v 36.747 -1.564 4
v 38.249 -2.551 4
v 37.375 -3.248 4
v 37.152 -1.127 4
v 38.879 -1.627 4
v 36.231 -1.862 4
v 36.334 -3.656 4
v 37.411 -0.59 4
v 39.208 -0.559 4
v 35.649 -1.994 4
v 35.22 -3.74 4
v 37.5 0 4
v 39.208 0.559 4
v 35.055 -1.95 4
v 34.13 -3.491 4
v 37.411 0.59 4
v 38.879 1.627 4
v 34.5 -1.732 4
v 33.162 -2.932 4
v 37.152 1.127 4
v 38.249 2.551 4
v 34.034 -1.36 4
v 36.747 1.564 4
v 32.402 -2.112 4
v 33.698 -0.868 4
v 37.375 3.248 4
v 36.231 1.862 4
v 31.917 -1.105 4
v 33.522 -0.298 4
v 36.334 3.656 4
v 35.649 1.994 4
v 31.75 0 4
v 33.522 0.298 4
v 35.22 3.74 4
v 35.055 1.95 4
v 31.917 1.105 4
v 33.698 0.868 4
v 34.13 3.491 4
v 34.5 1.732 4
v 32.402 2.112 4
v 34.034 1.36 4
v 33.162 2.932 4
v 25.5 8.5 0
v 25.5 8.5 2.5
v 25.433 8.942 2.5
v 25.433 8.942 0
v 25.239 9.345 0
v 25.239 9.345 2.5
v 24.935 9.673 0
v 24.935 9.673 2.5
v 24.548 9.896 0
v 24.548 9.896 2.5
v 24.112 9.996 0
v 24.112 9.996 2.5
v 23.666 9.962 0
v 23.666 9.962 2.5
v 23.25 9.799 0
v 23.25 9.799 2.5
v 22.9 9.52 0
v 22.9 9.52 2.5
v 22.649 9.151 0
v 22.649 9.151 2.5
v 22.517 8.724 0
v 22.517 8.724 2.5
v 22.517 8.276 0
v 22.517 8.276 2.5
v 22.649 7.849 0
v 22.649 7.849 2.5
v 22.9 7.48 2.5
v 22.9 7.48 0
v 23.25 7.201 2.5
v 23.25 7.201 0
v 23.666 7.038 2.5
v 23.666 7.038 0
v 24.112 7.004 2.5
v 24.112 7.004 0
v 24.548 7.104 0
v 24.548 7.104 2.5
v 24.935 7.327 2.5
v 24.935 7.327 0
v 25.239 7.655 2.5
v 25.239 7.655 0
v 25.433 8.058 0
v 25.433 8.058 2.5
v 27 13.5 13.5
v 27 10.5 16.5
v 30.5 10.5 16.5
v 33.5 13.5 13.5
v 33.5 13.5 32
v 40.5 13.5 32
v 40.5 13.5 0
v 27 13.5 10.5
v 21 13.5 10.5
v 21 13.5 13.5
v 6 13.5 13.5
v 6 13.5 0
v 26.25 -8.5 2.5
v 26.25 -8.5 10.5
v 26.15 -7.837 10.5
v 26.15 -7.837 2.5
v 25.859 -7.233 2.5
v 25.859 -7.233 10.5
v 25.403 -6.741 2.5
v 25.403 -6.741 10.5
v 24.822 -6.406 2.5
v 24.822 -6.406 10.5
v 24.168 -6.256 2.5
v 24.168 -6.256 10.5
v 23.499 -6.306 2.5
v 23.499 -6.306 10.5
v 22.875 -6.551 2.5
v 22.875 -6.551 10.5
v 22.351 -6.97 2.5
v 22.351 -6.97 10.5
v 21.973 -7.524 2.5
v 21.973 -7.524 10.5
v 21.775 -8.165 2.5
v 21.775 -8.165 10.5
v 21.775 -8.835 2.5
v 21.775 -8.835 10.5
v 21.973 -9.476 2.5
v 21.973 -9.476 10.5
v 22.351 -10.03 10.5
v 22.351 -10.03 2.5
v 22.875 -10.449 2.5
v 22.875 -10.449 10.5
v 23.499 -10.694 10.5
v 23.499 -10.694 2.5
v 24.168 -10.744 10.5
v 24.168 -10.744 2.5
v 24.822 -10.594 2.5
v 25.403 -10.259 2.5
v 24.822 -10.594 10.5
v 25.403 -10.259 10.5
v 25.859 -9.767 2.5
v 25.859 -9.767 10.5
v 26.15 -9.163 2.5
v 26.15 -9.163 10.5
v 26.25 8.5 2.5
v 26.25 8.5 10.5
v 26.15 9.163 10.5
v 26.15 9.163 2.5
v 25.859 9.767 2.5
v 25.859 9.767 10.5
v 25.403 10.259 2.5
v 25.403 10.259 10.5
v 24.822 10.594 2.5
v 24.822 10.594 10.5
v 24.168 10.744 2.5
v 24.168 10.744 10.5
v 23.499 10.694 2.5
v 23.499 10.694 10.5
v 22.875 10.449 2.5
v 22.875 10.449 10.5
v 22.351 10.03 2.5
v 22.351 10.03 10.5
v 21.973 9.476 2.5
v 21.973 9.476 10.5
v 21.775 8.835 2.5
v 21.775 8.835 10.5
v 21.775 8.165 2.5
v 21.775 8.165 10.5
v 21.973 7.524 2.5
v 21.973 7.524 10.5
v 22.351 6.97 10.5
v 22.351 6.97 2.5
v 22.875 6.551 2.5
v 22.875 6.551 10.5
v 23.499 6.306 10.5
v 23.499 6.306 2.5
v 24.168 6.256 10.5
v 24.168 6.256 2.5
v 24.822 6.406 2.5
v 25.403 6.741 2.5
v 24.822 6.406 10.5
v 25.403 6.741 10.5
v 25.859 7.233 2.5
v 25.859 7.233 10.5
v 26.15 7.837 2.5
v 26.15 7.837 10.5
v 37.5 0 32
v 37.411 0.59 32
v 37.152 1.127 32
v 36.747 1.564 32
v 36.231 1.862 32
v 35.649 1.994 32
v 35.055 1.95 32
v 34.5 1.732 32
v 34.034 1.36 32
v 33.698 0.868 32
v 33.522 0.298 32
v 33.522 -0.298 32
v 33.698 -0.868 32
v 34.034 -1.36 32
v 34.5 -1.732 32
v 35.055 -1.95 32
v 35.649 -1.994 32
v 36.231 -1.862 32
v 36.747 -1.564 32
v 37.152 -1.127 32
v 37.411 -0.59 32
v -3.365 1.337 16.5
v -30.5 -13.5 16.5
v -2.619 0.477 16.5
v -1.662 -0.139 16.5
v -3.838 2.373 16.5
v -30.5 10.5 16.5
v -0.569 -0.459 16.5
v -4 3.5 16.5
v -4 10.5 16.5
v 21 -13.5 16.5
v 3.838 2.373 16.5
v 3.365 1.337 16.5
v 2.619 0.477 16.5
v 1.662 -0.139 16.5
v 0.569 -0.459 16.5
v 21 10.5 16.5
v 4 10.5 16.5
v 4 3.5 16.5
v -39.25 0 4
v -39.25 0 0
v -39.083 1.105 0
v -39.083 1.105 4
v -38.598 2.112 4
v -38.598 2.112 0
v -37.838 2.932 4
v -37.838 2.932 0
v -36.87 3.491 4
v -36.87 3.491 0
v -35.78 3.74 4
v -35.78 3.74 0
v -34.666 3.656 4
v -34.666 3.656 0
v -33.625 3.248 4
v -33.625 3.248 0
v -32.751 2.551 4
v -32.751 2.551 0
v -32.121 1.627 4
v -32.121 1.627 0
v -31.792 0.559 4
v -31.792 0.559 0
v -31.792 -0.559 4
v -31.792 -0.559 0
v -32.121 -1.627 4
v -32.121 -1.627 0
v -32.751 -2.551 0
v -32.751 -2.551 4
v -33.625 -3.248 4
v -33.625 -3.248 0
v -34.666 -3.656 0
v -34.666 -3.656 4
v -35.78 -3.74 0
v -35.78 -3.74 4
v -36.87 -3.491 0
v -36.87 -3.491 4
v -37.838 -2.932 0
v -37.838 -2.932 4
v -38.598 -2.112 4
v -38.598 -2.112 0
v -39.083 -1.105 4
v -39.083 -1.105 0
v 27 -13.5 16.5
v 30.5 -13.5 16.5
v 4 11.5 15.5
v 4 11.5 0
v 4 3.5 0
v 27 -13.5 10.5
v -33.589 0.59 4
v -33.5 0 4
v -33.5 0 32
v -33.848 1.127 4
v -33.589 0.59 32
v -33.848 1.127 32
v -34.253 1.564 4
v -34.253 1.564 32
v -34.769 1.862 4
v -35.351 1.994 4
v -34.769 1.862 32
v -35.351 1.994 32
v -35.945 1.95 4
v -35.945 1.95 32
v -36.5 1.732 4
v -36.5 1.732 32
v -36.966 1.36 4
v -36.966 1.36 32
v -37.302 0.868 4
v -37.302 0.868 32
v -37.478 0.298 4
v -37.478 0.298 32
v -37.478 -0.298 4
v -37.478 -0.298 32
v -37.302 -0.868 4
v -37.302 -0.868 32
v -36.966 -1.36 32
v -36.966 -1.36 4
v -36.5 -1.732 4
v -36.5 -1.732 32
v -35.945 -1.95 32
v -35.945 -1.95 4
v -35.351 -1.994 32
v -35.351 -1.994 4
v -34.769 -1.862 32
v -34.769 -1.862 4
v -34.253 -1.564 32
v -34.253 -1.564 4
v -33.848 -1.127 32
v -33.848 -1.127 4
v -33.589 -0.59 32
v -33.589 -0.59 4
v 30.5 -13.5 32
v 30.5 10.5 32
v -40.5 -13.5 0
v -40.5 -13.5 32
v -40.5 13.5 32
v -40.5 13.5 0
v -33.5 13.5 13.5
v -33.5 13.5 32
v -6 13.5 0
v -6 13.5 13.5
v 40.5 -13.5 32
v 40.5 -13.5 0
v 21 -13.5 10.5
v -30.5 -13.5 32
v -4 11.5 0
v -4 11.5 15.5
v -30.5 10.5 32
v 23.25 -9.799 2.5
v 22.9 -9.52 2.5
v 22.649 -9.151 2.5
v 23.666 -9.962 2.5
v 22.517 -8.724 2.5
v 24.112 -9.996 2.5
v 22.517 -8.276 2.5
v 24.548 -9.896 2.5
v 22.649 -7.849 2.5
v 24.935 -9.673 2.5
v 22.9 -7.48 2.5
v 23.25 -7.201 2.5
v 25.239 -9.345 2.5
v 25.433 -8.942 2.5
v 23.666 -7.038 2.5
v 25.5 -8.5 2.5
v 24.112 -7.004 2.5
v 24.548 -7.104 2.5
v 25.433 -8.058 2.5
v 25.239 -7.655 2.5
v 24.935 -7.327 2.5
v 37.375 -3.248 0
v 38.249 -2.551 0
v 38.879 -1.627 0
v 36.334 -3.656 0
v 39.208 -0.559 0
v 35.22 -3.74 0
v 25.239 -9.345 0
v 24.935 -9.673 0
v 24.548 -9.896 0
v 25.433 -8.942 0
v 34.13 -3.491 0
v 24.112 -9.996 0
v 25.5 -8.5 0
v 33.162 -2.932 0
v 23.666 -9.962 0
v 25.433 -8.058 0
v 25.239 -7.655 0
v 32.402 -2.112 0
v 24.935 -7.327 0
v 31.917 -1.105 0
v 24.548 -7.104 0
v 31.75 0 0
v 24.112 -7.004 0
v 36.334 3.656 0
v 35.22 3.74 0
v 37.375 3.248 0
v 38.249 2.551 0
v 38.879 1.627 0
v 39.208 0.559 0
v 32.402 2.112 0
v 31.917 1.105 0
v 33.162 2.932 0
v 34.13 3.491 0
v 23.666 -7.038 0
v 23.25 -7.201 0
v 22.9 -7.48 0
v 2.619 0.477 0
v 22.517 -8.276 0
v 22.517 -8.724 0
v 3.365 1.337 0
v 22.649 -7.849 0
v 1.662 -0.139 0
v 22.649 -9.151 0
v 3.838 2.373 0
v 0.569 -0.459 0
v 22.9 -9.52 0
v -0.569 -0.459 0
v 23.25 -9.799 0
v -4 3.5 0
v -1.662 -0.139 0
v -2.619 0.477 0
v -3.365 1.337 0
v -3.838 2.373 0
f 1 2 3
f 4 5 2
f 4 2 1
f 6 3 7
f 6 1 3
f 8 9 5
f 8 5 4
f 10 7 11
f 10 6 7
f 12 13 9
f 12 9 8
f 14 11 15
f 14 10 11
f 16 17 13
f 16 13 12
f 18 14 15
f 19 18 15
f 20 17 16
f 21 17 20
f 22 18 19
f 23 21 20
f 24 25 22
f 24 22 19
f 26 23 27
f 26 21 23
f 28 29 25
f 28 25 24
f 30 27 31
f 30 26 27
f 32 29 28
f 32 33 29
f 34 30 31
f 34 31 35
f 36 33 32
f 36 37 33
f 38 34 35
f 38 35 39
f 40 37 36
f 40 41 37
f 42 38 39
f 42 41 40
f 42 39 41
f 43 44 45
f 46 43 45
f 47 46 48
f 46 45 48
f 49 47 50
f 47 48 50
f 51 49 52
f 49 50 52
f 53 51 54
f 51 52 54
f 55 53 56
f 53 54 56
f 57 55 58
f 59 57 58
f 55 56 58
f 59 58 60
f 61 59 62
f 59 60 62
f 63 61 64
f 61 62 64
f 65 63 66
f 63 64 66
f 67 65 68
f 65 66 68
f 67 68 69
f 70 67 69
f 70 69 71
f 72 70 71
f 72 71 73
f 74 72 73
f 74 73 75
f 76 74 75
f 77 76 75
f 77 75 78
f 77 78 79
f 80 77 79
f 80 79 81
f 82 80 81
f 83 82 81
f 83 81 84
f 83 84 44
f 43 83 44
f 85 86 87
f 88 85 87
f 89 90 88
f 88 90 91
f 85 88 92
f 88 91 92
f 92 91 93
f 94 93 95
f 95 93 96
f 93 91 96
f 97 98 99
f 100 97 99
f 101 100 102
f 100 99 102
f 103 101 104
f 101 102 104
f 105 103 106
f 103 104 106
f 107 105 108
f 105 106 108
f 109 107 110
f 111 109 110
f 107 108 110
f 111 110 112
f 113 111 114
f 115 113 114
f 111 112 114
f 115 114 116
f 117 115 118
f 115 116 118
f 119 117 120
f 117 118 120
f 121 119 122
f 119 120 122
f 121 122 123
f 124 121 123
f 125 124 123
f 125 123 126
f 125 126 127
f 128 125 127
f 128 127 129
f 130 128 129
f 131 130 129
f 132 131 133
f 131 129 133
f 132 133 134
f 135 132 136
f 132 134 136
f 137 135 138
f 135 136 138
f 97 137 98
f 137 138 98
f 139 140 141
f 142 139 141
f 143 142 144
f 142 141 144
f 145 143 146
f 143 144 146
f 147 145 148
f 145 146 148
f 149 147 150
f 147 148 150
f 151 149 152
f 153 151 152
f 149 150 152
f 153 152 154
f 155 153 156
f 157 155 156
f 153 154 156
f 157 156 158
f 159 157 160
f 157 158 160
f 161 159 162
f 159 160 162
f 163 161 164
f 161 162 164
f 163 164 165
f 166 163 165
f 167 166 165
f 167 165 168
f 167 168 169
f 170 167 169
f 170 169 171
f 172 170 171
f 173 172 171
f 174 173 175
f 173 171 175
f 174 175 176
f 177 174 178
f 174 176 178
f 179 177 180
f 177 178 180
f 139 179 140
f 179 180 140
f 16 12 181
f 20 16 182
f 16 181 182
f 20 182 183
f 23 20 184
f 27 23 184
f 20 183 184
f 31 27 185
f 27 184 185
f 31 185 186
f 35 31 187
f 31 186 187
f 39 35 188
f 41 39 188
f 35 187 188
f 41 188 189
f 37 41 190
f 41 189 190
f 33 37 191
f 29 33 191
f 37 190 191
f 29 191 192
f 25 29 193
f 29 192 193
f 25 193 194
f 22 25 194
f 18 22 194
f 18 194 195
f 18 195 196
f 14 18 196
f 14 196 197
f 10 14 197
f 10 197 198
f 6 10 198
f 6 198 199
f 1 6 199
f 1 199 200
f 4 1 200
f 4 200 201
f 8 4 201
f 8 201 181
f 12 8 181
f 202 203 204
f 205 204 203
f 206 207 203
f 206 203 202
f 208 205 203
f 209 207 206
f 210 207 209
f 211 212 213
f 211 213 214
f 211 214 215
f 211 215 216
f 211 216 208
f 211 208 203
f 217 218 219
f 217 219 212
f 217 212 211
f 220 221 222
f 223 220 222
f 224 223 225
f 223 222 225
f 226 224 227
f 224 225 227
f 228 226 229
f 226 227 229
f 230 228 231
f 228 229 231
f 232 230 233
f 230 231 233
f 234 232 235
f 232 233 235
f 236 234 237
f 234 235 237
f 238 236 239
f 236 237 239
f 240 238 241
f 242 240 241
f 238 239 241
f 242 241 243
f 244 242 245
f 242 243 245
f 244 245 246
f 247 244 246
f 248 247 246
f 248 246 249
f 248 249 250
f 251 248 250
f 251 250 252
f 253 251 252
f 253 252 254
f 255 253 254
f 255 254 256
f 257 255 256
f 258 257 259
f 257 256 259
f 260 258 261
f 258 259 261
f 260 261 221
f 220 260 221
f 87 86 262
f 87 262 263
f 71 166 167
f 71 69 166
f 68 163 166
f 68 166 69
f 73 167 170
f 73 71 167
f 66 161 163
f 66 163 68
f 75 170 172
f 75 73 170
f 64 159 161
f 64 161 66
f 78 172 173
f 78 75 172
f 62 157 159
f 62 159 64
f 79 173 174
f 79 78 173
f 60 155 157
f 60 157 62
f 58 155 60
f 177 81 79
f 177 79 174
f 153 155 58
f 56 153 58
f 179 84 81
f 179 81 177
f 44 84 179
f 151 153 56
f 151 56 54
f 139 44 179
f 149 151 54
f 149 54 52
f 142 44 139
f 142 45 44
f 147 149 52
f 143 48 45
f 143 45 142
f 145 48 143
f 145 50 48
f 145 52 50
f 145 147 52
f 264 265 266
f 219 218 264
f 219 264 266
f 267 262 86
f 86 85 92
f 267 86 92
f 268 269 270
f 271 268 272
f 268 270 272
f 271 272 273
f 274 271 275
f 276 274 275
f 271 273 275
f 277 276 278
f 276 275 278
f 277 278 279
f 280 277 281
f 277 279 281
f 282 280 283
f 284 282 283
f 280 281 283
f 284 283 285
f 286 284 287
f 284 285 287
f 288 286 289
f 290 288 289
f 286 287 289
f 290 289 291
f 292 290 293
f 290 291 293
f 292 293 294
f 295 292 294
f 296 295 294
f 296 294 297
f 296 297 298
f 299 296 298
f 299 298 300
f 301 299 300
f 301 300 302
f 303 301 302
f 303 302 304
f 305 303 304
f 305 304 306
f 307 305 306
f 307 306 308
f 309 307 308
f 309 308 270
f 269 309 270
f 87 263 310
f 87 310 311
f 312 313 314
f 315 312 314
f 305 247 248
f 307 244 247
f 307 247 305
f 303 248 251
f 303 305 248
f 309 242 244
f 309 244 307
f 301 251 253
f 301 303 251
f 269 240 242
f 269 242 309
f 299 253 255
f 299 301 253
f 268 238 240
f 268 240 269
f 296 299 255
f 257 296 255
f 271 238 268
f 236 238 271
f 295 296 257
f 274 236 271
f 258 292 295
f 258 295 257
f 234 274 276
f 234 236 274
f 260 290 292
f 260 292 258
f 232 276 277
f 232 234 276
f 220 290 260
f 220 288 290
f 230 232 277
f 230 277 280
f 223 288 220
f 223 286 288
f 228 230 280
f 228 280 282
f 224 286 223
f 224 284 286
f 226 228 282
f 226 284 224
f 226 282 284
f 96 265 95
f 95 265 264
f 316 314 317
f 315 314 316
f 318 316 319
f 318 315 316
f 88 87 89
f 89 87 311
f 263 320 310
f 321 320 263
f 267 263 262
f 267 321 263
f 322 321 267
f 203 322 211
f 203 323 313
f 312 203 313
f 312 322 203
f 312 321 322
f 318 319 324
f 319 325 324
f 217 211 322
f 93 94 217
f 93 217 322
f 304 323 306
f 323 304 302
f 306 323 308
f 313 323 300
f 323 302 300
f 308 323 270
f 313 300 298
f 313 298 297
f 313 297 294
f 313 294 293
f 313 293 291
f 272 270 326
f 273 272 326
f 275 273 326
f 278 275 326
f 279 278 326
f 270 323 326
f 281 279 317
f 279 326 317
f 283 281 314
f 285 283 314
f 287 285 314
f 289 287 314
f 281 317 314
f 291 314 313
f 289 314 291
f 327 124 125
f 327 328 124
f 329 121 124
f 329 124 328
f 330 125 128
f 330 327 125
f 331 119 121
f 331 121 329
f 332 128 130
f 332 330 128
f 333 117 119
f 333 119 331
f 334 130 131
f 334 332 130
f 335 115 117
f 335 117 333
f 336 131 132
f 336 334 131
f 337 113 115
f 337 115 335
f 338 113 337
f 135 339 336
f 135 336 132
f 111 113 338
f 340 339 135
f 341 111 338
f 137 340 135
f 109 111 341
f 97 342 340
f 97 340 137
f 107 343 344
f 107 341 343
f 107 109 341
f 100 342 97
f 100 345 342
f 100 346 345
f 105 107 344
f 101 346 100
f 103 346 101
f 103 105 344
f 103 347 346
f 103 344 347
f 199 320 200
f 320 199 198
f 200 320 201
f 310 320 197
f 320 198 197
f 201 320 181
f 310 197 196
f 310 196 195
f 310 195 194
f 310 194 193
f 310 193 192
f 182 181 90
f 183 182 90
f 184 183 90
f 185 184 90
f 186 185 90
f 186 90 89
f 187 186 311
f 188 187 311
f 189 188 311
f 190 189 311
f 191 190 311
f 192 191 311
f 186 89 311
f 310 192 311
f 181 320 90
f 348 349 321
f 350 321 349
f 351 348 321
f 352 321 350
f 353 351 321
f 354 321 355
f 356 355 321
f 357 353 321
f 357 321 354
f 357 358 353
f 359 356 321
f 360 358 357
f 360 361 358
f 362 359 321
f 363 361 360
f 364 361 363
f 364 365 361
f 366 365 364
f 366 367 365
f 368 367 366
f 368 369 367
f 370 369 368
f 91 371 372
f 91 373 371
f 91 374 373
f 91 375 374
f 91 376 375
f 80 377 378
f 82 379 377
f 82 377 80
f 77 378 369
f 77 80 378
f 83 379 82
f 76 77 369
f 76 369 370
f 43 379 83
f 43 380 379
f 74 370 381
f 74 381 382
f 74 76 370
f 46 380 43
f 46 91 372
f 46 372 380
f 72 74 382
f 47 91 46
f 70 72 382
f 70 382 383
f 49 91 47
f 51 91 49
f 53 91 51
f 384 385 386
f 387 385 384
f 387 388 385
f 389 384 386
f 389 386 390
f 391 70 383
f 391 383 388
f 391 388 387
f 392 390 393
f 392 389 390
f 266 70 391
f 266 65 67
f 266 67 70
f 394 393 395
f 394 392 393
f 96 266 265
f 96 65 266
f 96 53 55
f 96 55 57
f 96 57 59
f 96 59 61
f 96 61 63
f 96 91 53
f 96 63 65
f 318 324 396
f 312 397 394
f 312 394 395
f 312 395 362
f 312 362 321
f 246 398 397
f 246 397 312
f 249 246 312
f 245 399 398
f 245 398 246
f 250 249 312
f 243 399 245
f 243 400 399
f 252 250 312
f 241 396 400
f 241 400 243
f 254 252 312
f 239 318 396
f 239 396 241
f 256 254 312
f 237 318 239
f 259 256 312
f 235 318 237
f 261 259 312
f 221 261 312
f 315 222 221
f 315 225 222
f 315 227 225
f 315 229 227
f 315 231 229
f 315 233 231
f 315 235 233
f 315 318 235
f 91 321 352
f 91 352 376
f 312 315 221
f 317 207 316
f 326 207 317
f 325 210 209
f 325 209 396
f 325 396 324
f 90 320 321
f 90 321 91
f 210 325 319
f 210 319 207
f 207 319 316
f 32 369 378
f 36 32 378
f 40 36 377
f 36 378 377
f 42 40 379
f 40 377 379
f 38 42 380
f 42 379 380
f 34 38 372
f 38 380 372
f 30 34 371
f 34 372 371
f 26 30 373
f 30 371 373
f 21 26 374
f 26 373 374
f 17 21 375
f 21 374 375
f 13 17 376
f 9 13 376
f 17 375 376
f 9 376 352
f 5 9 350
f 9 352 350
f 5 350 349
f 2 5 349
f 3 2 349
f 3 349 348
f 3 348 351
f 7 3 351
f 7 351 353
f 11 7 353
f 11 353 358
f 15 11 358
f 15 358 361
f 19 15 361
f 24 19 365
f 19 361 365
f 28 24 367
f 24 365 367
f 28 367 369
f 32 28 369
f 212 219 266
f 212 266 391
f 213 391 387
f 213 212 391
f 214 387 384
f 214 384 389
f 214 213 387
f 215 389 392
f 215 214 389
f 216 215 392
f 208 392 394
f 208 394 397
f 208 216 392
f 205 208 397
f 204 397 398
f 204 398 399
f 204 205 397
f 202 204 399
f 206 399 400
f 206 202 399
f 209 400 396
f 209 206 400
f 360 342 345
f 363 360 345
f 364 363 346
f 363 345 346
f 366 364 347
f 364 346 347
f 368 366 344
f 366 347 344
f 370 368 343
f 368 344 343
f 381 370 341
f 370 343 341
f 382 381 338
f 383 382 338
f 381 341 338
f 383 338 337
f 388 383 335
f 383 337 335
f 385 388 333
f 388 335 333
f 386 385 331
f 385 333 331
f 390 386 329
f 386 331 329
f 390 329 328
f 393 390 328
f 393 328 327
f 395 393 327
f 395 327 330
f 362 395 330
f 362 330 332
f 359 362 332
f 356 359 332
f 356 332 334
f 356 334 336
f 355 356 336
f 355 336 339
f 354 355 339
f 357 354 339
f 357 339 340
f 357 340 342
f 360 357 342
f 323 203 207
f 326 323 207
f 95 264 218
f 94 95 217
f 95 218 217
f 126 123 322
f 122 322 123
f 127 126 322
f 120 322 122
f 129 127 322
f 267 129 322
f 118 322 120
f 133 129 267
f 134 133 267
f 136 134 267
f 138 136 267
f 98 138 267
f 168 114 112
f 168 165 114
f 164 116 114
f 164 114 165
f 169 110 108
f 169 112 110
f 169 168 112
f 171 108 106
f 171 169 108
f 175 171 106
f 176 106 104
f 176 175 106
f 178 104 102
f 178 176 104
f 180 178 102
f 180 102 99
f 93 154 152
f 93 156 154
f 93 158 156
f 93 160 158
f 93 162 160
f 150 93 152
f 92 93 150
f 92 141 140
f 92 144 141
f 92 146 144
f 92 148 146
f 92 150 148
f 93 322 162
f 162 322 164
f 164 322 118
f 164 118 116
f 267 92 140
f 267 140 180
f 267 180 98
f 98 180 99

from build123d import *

# Parameters (mm, degrees)
ESQUISSE5_W             = 61
ESQUISSE5_H             = 27
BOSS_EXTRU_2_DEPTH      = 16.5
ENL_V_MAT_EXTRU_2_DEPTH = 16.5
ESQUISSE7_W             = 10
ESQUISSE7_H             = 27
BOSS_EXTRU_3_DEPTH      = 32
ESQUISSE8_R             = 2
ENL_V_MAT_EXTRU_3_DEPTH = 40
ESQUISSE9_R             = 3.75
ENL_V_MAT_EXTRU_4_DEPTH = 4
CHANFREIN1_SIZE         = 2
CHANFREIN2_SIZE         = 3
ESQUISSE10_W            = 6
ESQUISSE10_H            = 6
ENL_V_MAT_EXTRU_5_DEPTH = 36
ESQUISSE11_R            = 2.25
ENL_V_MAT_EXTRU_6_DEPTH = 8
ESQUISSE12_R            = 1.5
ENL_V_MAT_EXTRU_7_DEPTH = 8
CHANFREIN3_SIZE         = 3


with BuildPart() as part:
    # Esquisse5 → Boss.-Extru.2 (new body)
    with BuildSketch(Plane.XY):
        Rectangle(ESQUISSE5_W, ESQUISSE5_H)
    extrude(amount=BOSS_EXTRU_2_DEPTH)

    # Esquisse6 → Enlèv. mat.-Extru.2 (cut)
    with BuildSketch(Plane.XY.offset(16.5)):
        with BuildLine():
            Line((-4, 38.524390244), (4, 38.524390244))
            Line((4, 38.524390244), (4, 3.5))
            ThreePointArc((4, 3.5), (0, -0.5), (-4, 3.5))
            Line((-4, 3.5), (-4, 38.524390244))
        make_face()
    extrude(amount=-ENL_V_MAT_EXTRU_2_DEPTH, mode=Mode.SUBTRACT)

    # Esquisse7 → Boss.-Extru.3 (add)
    with BuildSketch(Plane(origin=(0, 0, 0), x_dir=(-1, 0, 0), z_dir=(0, 0, -1))):
        with Locations((-35.5, 0)):
            Rectangle(ESQUISSE7_W, ESQUISSE7_H)
        with Locations((35.5, 0)):
            Rectangle(ESQUISSE7_W, ESQUISSE7_H)
    extrude(amount=-BOSS_EXTRU_3_DEPTH)

    # Esquisse8 → Enlèv. mat.-Extru.3 (cut)
    with BuildSketch(Plane.XY.offset(32)):
        with Locations((-35.5, 0)):
            Circle(ESQUISSE8_R)
        with Locations((35.5, 0)):
            Circle(ESQUISSE8_R)
    extrude(amount=-ENL_V_MAT_EXTRU_3_DEPTH, mode=Mode.SUBTRACT)

    # Esquisse9 → Enlèv. mat.-Extru.4 (cut)
    with BuildSketch(Plane(origin=(0, 0, 0), x_dir=(-1, 0, 0), z_dir=(0, 0, -1))):
        with Locations((-35.5, 0)):
            Circle(ESQUISSE9_R)
        with Locations((35.5, 0)):
            Circle(ESQUISSE9_R)
    extrude(amount=-ENL_V_MAT_EXTRU_4_DEPTH, mode=Mode.SUBTRACT)

    # Chanfrein1
    chanfrein1_edges = [part.edges().sort_by_distance(p)[0] for p in [
        (-4, 13.5, 8.25),
        (4, 13.5, 8.25),
    ]]
    chamfer(chanfrein1_edges, length=CHANFREIN1_SIZE)

    # Chanfrein2
    chanfrein2_edges = [part.edges().sort_by_distance(p)[0] for p in [
        (30.5, 13.5, 24.25),
        (-30.5, 13.5, 24.25),
    ]]
    chamfer(chanfrein2_edges, length=CHANFREIN2_SIZE)

    # Esquisse10 → Enlèv. mat.-Extru.5 (cut)
    with BuildSketch(Plane(origin=(0, 13.5, 0), x_dir=(1, 0, 0), z_dir=(0, 1, 0))):
        with Locations((24, -13.5)):
            Rectangle(ESQUISSE10_W, ESQUISSE10_H)
    extrude(amount=-ENL_V_MAT_EXTRU_5_DEPTH, mode=Mode.SUBTRACT)

    # Esquisse11 → Enlèv. mat.-Extru.6 (cut)
    with BuildSketch(Plane.XY.offset(10.5)):
        with Locations((24, 8.5)):
            Circle(ESQUISSE11_R)
        with Locations((24, -8.5)):
            Circle(ESQUISSE11_R)
    extrude(amount=-ENL_V_MAT_EXTRU_6_DEPTH, mode=Mode.SUBTRACT)

    # Esquisse12 → Enlèv. mat.-Extru.7 (cut)
    with BuildSketch(Plane.XY.offset(2.5)):
        with Locations((24, 8.5)):
            Circle(ESQUISSE12_R)
        with Locations((24, -8.5)):
            Circle(ESQUISSE12_R)
    extrude(amount=-ENL_V_MAT_EXTRU_7_DEPTH, mode=Mode.SUBTRACT)

    # Chanfrein3
    chanfrein3_edges = [part.edges().sort_by_distance(p)[0] for p in [
        (30.25, 13.5, 16.5),
        (13.5, 13.5, 16.5),
        (-19.75, 13.5, 16.5),
    ]]
    chamfer(chanfrein3_edges, length=CHANFREIN3_SIZE)


solid = part.part
